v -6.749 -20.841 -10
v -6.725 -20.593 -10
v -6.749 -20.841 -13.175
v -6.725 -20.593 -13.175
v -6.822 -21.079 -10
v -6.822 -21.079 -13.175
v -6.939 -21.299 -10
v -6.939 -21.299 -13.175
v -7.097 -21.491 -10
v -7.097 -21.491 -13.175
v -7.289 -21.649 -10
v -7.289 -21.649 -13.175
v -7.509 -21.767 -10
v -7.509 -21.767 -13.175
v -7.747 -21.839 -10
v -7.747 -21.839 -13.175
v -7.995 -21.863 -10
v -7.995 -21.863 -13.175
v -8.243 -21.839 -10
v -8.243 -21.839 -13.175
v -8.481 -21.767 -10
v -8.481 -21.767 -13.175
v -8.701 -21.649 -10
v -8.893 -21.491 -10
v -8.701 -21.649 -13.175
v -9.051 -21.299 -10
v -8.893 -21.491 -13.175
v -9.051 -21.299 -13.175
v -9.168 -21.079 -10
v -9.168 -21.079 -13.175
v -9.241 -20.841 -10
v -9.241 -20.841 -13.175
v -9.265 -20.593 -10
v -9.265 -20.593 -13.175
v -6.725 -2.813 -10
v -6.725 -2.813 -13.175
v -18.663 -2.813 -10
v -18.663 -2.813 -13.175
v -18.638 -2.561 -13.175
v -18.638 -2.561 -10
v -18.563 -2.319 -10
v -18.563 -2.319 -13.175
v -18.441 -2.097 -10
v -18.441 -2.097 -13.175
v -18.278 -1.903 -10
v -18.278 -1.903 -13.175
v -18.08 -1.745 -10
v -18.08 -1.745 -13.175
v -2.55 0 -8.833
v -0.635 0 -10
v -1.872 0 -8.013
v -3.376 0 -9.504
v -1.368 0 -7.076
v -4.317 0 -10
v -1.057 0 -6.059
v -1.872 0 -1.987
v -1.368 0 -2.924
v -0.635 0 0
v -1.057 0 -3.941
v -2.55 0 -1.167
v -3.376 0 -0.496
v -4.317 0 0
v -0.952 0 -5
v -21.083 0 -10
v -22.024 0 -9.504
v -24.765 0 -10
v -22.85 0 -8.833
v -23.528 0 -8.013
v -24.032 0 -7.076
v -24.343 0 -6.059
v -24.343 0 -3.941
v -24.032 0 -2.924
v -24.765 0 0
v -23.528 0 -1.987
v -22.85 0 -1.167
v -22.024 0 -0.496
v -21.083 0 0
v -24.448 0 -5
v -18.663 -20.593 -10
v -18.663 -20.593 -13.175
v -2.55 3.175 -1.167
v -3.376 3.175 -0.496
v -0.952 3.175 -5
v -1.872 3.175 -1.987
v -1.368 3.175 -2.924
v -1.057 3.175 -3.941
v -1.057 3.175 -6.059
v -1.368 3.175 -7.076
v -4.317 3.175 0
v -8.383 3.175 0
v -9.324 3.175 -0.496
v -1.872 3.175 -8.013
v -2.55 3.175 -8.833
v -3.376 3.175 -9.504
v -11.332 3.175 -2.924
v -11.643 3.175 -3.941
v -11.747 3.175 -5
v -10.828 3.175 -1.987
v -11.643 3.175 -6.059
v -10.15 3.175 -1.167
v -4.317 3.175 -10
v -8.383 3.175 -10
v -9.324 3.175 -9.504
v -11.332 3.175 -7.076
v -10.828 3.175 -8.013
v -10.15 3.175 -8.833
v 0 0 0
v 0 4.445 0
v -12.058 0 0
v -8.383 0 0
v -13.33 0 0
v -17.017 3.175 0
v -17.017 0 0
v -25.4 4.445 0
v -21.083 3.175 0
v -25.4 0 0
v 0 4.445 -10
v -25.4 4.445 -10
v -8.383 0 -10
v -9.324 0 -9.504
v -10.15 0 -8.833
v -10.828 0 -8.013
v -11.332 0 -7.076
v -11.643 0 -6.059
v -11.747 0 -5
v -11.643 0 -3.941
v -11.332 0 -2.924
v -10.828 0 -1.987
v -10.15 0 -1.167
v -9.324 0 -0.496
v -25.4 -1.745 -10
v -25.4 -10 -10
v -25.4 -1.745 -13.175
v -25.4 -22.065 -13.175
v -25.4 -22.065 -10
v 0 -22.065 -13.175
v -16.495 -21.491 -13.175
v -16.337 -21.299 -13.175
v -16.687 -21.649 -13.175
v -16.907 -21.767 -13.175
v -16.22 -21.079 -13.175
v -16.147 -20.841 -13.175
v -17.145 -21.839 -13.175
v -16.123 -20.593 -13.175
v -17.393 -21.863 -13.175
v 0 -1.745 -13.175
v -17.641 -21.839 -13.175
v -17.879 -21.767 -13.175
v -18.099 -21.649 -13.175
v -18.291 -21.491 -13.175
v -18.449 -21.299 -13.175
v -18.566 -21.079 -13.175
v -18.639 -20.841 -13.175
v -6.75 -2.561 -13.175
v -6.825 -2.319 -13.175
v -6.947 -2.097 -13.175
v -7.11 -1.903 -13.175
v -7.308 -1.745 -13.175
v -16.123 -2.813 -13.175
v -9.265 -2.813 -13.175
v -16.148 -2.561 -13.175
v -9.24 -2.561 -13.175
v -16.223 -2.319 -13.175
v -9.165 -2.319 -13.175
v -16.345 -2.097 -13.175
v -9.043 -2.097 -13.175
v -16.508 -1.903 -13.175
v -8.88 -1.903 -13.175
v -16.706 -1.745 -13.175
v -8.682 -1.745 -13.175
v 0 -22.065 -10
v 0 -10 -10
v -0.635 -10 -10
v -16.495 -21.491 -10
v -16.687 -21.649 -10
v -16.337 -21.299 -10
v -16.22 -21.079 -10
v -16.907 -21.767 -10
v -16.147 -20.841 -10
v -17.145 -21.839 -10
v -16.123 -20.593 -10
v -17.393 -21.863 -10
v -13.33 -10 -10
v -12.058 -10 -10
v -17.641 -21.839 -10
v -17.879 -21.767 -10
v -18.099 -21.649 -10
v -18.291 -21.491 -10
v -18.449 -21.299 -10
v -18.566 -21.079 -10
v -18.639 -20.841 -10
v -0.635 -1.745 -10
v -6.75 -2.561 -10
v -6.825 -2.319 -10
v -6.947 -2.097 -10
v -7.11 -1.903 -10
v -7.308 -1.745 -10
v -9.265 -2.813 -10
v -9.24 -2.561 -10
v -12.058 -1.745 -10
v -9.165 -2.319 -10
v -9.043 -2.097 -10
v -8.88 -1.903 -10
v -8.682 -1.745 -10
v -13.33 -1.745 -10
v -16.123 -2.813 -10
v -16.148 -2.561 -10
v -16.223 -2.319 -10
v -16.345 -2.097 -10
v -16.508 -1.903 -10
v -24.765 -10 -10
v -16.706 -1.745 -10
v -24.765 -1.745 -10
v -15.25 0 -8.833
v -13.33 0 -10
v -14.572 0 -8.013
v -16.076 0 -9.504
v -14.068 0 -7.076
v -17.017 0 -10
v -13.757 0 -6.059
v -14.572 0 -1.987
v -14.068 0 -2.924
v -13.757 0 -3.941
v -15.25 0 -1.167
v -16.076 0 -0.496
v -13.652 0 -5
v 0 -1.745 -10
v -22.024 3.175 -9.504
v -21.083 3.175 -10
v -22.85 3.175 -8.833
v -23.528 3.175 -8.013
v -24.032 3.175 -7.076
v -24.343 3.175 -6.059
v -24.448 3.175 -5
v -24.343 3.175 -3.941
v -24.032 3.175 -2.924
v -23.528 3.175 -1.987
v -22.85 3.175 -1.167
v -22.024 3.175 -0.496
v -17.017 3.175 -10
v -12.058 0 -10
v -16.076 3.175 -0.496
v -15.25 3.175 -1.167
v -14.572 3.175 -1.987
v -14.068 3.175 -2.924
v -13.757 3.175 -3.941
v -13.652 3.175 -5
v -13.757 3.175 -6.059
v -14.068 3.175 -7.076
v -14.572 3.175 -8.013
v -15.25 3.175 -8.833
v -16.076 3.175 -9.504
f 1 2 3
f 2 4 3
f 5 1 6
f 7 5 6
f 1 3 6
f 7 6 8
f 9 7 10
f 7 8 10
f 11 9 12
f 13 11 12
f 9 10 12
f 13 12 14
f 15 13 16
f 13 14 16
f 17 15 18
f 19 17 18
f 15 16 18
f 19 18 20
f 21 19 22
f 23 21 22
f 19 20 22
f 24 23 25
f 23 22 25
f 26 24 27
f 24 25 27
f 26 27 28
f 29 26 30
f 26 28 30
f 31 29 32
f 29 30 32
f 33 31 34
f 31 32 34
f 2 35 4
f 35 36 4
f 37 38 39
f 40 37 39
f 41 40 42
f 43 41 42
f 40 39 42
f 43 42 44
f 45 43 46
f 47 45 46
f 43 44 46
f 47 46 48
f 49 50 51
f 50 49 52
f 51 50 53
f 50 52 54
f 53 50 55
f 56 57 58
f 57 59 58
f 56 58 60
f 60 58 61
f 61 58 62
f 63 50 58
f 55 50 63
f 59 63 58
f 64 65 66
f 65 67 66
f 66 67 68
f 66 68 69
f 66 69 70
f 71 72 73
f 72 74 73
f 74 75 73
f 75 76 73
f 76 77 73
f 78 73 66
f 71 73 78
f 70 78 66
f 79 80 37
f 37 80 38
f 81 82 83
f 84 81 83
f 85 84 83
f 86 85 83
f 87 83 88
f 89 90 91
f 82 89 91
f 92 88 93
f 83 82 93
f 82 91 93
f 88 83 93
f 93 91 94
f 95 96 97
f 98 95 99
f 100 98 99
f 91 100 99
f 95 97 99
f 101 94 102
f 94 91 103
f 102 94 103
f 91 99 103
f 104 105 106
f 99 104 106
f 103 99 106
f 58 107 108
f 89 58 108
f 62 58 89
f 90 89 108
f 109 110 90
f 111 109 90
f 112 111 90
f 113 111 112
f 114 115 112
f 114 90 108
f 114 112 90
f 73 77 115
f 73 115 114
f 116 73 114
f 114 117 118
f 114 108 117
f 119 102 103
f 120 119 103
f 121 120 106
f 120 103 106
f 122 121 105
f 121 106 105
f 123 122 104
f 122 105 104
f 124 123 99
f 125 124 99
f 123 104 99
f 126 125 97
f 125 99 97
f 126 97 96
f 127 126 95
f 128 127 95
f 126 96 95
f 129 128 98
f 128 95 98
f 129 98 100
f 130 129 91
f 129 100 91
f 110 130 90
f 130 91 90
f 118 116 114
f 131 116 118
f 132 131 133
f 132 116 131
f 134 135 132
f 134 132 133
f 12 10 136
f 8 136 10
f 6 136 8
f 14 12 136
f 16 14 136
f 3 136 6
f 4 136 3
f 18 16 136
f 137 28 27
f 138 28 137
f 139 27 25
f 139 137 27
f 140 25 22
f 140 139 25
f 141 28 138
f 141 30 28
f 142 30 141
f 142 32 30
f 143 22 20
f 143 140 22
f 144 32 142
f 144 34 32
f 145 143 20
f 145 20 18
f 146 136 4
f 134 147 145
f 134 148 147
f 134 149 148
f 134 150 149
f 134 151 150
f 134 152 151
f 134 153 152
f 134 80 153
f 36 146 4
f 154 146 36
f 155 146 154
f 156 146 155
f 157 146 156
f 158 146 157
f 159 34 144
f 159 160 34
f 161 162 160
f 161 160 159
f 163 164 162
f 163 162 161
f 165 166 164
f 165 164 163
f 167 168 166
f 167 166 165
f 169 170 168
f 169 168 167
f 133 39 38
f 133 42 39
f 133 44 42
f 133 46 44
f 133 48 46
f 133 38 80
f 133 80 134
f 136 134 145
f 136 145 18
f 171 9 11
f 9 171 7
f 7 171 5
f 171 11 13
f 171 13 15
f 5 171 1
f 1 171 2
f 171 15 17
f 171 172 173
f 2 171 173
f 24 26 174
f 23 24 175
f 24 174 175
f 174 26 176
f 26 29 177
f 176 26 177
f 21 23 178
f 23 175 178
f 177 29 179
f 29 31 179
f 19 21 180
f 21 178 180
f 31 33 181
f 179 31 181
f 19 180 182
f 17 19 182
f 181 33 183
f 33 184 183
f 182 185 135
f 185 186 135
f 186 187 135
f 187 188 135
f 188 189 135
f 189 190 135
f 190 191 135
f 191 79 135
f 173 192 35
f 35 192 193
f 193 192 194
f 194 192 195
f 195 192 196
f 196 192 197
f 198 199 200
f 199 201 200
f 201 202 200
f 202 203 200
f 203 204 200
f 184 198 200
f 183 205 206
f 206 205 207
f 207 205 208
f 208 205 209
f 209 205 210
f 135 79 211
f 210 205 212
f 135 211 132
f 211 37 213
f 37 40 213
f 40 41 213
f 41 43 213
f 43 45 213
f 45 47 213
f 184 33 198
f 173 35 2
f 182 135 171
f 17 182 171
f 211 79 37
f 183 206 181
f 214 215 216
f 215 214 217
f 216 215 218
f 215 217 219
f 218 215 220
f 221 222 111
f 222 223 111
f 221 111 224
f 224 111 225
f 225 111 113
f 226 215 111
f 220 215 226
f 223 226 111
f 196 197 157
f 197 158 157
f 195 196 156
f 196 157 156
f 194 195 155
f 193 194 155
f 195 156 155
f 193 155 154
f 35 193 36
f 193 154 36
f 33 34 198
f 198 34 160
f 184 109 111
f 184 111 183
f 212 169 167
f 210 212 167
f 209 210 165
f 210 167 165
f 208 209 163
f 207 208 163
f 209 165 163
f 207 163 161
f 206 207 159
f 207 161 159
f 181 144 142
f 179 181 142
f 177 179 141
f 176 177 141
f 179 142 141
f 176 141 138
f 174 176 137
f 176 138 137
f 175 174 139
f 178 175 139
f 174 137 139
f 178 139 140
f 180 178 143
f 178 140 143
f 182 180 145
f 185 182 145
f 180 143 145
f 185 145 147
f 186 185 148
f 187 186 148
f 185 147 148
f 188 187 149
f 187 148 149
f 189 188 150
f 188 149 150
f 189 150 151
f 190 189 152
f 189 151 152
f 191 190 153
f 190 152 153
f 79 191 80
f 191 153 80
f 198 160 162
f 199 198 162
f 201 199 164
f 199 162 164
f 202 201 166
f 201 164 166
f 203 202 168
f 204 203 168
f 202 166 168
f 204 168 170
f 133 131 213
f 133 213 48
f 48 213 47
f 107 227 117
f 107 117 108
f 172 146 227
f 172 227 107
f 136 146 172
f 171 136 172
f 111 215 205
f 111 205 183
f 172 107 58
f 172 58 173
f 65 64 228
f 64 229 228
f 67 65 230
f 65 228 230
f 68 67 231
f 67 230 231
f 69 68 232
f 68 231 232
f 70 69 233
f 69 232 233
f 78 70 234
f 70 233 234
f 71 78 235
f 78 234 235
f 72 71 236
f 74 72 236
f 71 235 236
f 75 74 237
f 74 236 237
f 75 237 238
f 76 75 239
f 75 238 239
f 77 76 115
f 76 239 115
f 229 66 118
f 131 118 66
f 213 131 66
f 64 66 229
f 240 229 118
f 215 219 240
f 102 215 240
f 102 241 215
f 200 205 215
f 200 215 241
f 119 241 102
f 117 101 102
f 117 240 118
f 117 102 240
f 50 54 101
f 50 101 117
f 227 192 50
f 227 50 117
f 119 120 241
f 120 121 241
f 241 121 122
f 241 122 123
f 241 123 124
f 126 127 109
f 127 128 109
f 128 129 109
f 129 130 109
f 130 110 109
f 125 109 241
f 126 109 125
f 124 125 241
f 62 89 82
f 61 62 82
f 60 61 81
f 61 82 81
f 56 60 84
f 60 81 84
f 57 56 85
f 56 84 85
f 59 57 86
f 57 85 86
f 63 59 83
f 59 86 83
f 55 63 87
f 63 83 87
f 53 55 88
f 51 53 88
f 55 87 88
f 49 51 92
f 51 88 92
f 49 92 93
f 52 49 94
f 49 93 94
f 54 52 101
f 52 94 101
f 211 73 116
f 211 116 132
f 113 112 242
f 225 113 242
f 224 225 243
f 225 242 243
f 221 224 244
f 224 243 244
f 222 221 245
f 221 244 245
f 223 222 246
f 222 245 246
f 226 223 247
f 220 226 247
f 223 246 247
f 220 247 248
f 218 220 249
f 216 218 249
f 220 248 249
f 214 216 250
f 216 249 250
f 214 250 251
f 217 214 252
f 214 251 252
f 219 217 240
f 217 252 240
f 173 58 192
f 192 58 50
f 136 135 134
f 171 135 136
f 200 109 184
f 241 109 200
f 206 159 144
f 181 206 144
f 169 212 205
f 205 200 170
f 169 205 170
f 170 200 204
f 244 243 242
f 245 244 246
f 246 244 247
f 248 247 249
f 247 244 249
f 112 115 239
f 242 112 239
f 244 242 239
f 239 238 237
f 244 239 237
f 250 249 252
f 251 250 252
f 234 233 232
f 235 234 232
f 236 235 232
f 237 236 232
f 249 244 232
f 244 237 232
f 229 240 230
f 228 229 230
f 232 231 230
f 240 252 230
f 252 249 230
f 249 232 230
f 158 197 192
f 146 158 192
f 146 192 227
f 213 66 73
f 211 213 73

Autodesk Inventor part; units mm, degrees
ref_plane "YZ Plane" through (0, 0, 0) normal (1, 0, 0) x (0, 1, 0)
ref_plane "XZ Plane" through (0, 0, 0) normal (0, 1, 0) x (-1, 0, 0)
ref_plane "XY Plane" through (0, 0, 0) normal (0, 0, 1) x (1, 0, 0)
sketch "Sketch1" plane through (0, 0, 0) normal (0, 1, 0) x (-1, 0, 0)
  line L0 (0, 0) -> (25.4, 0)
  line L1 (25.4, 0) -> (25.4, -10)
  line L2 (25.4, -10) -> (0, -10)
  line L3 (0, -10) -> (0, 0)
  line L4 (25.4, -5) -> (19.05, -5)
  line L5 (19.05, -5) -> (6.35, -5)
  dimension "d0" = 25.4
  dimension "d1" = 10
  dimension "d4" = 6.35
  dimension "d5" = 12.7
extrude "Extrusion1" add sketch "Sketch1" along normal blind 4.445
hole "Hole1" at (-6.35, 0, -5) at (-19.05, 0, -5) direction (0, 1, 0) diameter 10.795 depth 3.175
sketch "Sketch2" plane through (0, 0, 0) normal (0, -1, 0) x (1, 0, 0)
  line L0 (-25.4, 0) -> (0, 0) projected
  line L1 (0, -10) -> (-25.4, -10) projected
  line L2 (0, 0) -> (-0.635, 0)
  line L3 (-0.635, 0) -> (-0.635, -10)
  line L4 (-0.635, -10) -> (0, -10)
  line L5 (0, -10) -> (0, 0)
  line L6 (-17.017, 0) -> (-8.383, 0) projected
  line L7 (-12.7, 0) -> (-12.0585, 0)
  line L8 (-12.0585, 0) -> (-12.0585, -10)
  line L9 (-12.0585, -10) -> (-12.7, -10)
  line L10 (-12.7, -10) -> (-12.7, 0)
  line L11 (-12.7, -10) -> (-13.3295, -10)
  line L12 (-13.3295, -10) -> (-13.3295, 0)
  line L13 (-13.3295, 0) -> (-12.7, 0)
  line L14 (-12.7, 0) -> (-12.7, -10)
  line L15 (-25.4, -10) -> (-25.4, 0) projected
  line L16 (-25.4, 0) -> (-21.083, 0) projected
  line L17 (-25.4, -10) -> (-24.765, -10)
  line L18 (-24.765, -10) -> (-24.765, 0)
  line L19 (-24.765, 0) -> (-25.4, 0)
  line L20 (-25.4, 0) -> (-25.4, -10)
  point P0 (-24.765, 0)
  dimension "d13" = 0.635
  dimension "d14" = 0.635
sketch "Sketch3" plane through (0, 0, 0) normal (1, 0, 0) x (0, 0, -1)
  line L0 (0, 4.445) -> (10, 4.445) projected
  line L1 (5, 4.445) -> (9.445, 0)
  line L2 (10, 0) -> (0, 0) projected
  line L3 (5, 4.445) -> (11.2862, 4.445) construction
  dimension "d15" = 45
extrude "Extrusion2" add sketch "Sketch2" along normal blind 25.4 contours L0 L18 L1 L15 | L12 L0 L10 L1 | L10 L0 L8 L1 | L3 L0 L5 L1
sketch "Sketch4" plane through (0, 4.445, 0) normal (1, 0, 0) x (0, 0, -1)
  line L0 (0, -4.445) -> (10, -14.445)
  line L1 (10, -29.845) -> (10, 0) projected
  line L2 (0, -4.445) -> (14.1421, -4.445) construction
  line L3 (0, -4.445) -> (0, -29.845) projected
  line L4 (0, -4.445) -> (0, -29.845)
  line L5 (0, -29.845) -> (10, -29.845) projected
  line L6 (0, -29.845) -> (10, -29.845)
  line L7 (10, -29.845) -> (10, -14.445)
  dimension "d18" = 45
extrude "Extrusion3" cut sketch "Sketch4" against normal blind 25.4
sketch "Sketch5" plane through (0, 4.445, -10) normal (0, 0, -1) x (-1, 0, 0)
  line L0 (25.4, -14.445) -> (25.4, -4.445) projected
  line L1 (-13.6769, -18.89) -> (25.4, -18.89)
  line L2 (25.4, -18.89) -> (25.4, -6.19)
  line L3 (25.4, -6.19) -> (-13.6769, -6.19)
  line L4 (-13.6769, -6.19) -> (-13.6769, -18.89)
  line L5 (0, -14.445) -> (0, 0) projected
  line L6 (0, -6.19) -> (25.4, -6.19)
  line L7 (25.4, -6.19) -> (25.4, -26.51)
  line L8 (25.4, -26.51) -> (0, -26.51)
  line L9 (0, -26.51) -> (0, -6.19)
  point P0 (0, -4.445)
  point P1 (25.4, -18.89)
  dimension "d21" = 12.7
  dimension "d28" = 20.32
extrude "Extrusion4" add sketch "Sketch5" along normal blind 3.175 contours L2 L1 L9 L5 L3 L0 | L7 L8 L9 L1
sketch "Sketch6" plane through (0, 4.445, -13.175) normal (0, 0, -1) x (-1, 0, 0)
  line L0 (12.0585, -6.19) -> (13.3295, -6.19) projected
  line L1 (12.694, -6.19) -> (12.694, -11.3085)
  line L2 (12.694, -11.3085) -> (12.694, -19.0349)
  line L3 (12.694, -16.1482) -> (7.995, -16.1482)
  line L4 (7.995, -16.1482) -> (17.393, -16.1482)
  line L5 (7.995, -21.2233) -> (7.995, -11.0732) construction
  line L6 (9.265, -21.2233) -> (9.265, -11.0732)
  line L7 (6.725, -11.0732) -> (6.725, -21.2233)
  arc A0 (6.725, -21.2233) -> (9.265, -21.2233) centre (7.995, -21.2233) ccw
  arc A1 (9.265, -11.0732) -> (6.725, -11.0732) centre (7.995, -11.0732) ccw
  line L8 (17.393, -21.2233) -> (17.393, -11.0732) construction
  line L9 (18.663, -21.2233) -> (18.663, -11.0732)
  line L10 (16.123, -11.0732) -> (16.123, -21.2233)
  arc A2 (16.123, -21.2233) -> (18.663, -21.2233) centre (17.393, -21.2233) ccw
  arc A3 (18.663, -11.0732) -> (16.123, -11.0732) centre (17.393, -11.0732) ccw
  line L11 (7.995, -25.0382) -> (7.995, -7.2582) construction
  line L12 (9.265, -25.0382) -> (9.265, -7.2582)
  line L13 (6.725, -7.2582) -> (6.725, -25.0382)
  arc A4 (6.725, -25.0382) -> (9.265, -25.0382) centre (7.995, -25.0382) ccw
  arc A5 (9.265, -7.2582) -> (6.725, -7.2582) centre (7.995, -7.2582) ccw
  line L14 (17.393, -25.0382) -> (17.393, -7.2582) construction
  line L15 (18.663, -25.0382) -> (18.663, -7.2582)
  line L16 (16.123, -7.2582) -> (16.123, -25.0382)
  arc A6 (16.123, -25.0382) -> (18.663, -25.0382) centre (17.393, -25.0382) ccw
  arc A7 (18.663, -7.2582) -> (16.123, -7.2582) centre (17.393, -7.2582) ccw
  point P0 (0, -4.445)
  point P1 (18.663, -11.0732)
  dimension "d24" = 4.699
  dimension "d25" = 9.398
  dimension "d26" = 2.54
  dimension "d27" = 2.54
  dimension "d29" = 8.89
  dimension "d30" = 2.54
  dimension "d31" = 8.89
  dimension "d32" = 2.54
extrude "Extrusion5" cut sketch "Sketch6" against normal blind 3.175
properties part number "door limit switch holder"
